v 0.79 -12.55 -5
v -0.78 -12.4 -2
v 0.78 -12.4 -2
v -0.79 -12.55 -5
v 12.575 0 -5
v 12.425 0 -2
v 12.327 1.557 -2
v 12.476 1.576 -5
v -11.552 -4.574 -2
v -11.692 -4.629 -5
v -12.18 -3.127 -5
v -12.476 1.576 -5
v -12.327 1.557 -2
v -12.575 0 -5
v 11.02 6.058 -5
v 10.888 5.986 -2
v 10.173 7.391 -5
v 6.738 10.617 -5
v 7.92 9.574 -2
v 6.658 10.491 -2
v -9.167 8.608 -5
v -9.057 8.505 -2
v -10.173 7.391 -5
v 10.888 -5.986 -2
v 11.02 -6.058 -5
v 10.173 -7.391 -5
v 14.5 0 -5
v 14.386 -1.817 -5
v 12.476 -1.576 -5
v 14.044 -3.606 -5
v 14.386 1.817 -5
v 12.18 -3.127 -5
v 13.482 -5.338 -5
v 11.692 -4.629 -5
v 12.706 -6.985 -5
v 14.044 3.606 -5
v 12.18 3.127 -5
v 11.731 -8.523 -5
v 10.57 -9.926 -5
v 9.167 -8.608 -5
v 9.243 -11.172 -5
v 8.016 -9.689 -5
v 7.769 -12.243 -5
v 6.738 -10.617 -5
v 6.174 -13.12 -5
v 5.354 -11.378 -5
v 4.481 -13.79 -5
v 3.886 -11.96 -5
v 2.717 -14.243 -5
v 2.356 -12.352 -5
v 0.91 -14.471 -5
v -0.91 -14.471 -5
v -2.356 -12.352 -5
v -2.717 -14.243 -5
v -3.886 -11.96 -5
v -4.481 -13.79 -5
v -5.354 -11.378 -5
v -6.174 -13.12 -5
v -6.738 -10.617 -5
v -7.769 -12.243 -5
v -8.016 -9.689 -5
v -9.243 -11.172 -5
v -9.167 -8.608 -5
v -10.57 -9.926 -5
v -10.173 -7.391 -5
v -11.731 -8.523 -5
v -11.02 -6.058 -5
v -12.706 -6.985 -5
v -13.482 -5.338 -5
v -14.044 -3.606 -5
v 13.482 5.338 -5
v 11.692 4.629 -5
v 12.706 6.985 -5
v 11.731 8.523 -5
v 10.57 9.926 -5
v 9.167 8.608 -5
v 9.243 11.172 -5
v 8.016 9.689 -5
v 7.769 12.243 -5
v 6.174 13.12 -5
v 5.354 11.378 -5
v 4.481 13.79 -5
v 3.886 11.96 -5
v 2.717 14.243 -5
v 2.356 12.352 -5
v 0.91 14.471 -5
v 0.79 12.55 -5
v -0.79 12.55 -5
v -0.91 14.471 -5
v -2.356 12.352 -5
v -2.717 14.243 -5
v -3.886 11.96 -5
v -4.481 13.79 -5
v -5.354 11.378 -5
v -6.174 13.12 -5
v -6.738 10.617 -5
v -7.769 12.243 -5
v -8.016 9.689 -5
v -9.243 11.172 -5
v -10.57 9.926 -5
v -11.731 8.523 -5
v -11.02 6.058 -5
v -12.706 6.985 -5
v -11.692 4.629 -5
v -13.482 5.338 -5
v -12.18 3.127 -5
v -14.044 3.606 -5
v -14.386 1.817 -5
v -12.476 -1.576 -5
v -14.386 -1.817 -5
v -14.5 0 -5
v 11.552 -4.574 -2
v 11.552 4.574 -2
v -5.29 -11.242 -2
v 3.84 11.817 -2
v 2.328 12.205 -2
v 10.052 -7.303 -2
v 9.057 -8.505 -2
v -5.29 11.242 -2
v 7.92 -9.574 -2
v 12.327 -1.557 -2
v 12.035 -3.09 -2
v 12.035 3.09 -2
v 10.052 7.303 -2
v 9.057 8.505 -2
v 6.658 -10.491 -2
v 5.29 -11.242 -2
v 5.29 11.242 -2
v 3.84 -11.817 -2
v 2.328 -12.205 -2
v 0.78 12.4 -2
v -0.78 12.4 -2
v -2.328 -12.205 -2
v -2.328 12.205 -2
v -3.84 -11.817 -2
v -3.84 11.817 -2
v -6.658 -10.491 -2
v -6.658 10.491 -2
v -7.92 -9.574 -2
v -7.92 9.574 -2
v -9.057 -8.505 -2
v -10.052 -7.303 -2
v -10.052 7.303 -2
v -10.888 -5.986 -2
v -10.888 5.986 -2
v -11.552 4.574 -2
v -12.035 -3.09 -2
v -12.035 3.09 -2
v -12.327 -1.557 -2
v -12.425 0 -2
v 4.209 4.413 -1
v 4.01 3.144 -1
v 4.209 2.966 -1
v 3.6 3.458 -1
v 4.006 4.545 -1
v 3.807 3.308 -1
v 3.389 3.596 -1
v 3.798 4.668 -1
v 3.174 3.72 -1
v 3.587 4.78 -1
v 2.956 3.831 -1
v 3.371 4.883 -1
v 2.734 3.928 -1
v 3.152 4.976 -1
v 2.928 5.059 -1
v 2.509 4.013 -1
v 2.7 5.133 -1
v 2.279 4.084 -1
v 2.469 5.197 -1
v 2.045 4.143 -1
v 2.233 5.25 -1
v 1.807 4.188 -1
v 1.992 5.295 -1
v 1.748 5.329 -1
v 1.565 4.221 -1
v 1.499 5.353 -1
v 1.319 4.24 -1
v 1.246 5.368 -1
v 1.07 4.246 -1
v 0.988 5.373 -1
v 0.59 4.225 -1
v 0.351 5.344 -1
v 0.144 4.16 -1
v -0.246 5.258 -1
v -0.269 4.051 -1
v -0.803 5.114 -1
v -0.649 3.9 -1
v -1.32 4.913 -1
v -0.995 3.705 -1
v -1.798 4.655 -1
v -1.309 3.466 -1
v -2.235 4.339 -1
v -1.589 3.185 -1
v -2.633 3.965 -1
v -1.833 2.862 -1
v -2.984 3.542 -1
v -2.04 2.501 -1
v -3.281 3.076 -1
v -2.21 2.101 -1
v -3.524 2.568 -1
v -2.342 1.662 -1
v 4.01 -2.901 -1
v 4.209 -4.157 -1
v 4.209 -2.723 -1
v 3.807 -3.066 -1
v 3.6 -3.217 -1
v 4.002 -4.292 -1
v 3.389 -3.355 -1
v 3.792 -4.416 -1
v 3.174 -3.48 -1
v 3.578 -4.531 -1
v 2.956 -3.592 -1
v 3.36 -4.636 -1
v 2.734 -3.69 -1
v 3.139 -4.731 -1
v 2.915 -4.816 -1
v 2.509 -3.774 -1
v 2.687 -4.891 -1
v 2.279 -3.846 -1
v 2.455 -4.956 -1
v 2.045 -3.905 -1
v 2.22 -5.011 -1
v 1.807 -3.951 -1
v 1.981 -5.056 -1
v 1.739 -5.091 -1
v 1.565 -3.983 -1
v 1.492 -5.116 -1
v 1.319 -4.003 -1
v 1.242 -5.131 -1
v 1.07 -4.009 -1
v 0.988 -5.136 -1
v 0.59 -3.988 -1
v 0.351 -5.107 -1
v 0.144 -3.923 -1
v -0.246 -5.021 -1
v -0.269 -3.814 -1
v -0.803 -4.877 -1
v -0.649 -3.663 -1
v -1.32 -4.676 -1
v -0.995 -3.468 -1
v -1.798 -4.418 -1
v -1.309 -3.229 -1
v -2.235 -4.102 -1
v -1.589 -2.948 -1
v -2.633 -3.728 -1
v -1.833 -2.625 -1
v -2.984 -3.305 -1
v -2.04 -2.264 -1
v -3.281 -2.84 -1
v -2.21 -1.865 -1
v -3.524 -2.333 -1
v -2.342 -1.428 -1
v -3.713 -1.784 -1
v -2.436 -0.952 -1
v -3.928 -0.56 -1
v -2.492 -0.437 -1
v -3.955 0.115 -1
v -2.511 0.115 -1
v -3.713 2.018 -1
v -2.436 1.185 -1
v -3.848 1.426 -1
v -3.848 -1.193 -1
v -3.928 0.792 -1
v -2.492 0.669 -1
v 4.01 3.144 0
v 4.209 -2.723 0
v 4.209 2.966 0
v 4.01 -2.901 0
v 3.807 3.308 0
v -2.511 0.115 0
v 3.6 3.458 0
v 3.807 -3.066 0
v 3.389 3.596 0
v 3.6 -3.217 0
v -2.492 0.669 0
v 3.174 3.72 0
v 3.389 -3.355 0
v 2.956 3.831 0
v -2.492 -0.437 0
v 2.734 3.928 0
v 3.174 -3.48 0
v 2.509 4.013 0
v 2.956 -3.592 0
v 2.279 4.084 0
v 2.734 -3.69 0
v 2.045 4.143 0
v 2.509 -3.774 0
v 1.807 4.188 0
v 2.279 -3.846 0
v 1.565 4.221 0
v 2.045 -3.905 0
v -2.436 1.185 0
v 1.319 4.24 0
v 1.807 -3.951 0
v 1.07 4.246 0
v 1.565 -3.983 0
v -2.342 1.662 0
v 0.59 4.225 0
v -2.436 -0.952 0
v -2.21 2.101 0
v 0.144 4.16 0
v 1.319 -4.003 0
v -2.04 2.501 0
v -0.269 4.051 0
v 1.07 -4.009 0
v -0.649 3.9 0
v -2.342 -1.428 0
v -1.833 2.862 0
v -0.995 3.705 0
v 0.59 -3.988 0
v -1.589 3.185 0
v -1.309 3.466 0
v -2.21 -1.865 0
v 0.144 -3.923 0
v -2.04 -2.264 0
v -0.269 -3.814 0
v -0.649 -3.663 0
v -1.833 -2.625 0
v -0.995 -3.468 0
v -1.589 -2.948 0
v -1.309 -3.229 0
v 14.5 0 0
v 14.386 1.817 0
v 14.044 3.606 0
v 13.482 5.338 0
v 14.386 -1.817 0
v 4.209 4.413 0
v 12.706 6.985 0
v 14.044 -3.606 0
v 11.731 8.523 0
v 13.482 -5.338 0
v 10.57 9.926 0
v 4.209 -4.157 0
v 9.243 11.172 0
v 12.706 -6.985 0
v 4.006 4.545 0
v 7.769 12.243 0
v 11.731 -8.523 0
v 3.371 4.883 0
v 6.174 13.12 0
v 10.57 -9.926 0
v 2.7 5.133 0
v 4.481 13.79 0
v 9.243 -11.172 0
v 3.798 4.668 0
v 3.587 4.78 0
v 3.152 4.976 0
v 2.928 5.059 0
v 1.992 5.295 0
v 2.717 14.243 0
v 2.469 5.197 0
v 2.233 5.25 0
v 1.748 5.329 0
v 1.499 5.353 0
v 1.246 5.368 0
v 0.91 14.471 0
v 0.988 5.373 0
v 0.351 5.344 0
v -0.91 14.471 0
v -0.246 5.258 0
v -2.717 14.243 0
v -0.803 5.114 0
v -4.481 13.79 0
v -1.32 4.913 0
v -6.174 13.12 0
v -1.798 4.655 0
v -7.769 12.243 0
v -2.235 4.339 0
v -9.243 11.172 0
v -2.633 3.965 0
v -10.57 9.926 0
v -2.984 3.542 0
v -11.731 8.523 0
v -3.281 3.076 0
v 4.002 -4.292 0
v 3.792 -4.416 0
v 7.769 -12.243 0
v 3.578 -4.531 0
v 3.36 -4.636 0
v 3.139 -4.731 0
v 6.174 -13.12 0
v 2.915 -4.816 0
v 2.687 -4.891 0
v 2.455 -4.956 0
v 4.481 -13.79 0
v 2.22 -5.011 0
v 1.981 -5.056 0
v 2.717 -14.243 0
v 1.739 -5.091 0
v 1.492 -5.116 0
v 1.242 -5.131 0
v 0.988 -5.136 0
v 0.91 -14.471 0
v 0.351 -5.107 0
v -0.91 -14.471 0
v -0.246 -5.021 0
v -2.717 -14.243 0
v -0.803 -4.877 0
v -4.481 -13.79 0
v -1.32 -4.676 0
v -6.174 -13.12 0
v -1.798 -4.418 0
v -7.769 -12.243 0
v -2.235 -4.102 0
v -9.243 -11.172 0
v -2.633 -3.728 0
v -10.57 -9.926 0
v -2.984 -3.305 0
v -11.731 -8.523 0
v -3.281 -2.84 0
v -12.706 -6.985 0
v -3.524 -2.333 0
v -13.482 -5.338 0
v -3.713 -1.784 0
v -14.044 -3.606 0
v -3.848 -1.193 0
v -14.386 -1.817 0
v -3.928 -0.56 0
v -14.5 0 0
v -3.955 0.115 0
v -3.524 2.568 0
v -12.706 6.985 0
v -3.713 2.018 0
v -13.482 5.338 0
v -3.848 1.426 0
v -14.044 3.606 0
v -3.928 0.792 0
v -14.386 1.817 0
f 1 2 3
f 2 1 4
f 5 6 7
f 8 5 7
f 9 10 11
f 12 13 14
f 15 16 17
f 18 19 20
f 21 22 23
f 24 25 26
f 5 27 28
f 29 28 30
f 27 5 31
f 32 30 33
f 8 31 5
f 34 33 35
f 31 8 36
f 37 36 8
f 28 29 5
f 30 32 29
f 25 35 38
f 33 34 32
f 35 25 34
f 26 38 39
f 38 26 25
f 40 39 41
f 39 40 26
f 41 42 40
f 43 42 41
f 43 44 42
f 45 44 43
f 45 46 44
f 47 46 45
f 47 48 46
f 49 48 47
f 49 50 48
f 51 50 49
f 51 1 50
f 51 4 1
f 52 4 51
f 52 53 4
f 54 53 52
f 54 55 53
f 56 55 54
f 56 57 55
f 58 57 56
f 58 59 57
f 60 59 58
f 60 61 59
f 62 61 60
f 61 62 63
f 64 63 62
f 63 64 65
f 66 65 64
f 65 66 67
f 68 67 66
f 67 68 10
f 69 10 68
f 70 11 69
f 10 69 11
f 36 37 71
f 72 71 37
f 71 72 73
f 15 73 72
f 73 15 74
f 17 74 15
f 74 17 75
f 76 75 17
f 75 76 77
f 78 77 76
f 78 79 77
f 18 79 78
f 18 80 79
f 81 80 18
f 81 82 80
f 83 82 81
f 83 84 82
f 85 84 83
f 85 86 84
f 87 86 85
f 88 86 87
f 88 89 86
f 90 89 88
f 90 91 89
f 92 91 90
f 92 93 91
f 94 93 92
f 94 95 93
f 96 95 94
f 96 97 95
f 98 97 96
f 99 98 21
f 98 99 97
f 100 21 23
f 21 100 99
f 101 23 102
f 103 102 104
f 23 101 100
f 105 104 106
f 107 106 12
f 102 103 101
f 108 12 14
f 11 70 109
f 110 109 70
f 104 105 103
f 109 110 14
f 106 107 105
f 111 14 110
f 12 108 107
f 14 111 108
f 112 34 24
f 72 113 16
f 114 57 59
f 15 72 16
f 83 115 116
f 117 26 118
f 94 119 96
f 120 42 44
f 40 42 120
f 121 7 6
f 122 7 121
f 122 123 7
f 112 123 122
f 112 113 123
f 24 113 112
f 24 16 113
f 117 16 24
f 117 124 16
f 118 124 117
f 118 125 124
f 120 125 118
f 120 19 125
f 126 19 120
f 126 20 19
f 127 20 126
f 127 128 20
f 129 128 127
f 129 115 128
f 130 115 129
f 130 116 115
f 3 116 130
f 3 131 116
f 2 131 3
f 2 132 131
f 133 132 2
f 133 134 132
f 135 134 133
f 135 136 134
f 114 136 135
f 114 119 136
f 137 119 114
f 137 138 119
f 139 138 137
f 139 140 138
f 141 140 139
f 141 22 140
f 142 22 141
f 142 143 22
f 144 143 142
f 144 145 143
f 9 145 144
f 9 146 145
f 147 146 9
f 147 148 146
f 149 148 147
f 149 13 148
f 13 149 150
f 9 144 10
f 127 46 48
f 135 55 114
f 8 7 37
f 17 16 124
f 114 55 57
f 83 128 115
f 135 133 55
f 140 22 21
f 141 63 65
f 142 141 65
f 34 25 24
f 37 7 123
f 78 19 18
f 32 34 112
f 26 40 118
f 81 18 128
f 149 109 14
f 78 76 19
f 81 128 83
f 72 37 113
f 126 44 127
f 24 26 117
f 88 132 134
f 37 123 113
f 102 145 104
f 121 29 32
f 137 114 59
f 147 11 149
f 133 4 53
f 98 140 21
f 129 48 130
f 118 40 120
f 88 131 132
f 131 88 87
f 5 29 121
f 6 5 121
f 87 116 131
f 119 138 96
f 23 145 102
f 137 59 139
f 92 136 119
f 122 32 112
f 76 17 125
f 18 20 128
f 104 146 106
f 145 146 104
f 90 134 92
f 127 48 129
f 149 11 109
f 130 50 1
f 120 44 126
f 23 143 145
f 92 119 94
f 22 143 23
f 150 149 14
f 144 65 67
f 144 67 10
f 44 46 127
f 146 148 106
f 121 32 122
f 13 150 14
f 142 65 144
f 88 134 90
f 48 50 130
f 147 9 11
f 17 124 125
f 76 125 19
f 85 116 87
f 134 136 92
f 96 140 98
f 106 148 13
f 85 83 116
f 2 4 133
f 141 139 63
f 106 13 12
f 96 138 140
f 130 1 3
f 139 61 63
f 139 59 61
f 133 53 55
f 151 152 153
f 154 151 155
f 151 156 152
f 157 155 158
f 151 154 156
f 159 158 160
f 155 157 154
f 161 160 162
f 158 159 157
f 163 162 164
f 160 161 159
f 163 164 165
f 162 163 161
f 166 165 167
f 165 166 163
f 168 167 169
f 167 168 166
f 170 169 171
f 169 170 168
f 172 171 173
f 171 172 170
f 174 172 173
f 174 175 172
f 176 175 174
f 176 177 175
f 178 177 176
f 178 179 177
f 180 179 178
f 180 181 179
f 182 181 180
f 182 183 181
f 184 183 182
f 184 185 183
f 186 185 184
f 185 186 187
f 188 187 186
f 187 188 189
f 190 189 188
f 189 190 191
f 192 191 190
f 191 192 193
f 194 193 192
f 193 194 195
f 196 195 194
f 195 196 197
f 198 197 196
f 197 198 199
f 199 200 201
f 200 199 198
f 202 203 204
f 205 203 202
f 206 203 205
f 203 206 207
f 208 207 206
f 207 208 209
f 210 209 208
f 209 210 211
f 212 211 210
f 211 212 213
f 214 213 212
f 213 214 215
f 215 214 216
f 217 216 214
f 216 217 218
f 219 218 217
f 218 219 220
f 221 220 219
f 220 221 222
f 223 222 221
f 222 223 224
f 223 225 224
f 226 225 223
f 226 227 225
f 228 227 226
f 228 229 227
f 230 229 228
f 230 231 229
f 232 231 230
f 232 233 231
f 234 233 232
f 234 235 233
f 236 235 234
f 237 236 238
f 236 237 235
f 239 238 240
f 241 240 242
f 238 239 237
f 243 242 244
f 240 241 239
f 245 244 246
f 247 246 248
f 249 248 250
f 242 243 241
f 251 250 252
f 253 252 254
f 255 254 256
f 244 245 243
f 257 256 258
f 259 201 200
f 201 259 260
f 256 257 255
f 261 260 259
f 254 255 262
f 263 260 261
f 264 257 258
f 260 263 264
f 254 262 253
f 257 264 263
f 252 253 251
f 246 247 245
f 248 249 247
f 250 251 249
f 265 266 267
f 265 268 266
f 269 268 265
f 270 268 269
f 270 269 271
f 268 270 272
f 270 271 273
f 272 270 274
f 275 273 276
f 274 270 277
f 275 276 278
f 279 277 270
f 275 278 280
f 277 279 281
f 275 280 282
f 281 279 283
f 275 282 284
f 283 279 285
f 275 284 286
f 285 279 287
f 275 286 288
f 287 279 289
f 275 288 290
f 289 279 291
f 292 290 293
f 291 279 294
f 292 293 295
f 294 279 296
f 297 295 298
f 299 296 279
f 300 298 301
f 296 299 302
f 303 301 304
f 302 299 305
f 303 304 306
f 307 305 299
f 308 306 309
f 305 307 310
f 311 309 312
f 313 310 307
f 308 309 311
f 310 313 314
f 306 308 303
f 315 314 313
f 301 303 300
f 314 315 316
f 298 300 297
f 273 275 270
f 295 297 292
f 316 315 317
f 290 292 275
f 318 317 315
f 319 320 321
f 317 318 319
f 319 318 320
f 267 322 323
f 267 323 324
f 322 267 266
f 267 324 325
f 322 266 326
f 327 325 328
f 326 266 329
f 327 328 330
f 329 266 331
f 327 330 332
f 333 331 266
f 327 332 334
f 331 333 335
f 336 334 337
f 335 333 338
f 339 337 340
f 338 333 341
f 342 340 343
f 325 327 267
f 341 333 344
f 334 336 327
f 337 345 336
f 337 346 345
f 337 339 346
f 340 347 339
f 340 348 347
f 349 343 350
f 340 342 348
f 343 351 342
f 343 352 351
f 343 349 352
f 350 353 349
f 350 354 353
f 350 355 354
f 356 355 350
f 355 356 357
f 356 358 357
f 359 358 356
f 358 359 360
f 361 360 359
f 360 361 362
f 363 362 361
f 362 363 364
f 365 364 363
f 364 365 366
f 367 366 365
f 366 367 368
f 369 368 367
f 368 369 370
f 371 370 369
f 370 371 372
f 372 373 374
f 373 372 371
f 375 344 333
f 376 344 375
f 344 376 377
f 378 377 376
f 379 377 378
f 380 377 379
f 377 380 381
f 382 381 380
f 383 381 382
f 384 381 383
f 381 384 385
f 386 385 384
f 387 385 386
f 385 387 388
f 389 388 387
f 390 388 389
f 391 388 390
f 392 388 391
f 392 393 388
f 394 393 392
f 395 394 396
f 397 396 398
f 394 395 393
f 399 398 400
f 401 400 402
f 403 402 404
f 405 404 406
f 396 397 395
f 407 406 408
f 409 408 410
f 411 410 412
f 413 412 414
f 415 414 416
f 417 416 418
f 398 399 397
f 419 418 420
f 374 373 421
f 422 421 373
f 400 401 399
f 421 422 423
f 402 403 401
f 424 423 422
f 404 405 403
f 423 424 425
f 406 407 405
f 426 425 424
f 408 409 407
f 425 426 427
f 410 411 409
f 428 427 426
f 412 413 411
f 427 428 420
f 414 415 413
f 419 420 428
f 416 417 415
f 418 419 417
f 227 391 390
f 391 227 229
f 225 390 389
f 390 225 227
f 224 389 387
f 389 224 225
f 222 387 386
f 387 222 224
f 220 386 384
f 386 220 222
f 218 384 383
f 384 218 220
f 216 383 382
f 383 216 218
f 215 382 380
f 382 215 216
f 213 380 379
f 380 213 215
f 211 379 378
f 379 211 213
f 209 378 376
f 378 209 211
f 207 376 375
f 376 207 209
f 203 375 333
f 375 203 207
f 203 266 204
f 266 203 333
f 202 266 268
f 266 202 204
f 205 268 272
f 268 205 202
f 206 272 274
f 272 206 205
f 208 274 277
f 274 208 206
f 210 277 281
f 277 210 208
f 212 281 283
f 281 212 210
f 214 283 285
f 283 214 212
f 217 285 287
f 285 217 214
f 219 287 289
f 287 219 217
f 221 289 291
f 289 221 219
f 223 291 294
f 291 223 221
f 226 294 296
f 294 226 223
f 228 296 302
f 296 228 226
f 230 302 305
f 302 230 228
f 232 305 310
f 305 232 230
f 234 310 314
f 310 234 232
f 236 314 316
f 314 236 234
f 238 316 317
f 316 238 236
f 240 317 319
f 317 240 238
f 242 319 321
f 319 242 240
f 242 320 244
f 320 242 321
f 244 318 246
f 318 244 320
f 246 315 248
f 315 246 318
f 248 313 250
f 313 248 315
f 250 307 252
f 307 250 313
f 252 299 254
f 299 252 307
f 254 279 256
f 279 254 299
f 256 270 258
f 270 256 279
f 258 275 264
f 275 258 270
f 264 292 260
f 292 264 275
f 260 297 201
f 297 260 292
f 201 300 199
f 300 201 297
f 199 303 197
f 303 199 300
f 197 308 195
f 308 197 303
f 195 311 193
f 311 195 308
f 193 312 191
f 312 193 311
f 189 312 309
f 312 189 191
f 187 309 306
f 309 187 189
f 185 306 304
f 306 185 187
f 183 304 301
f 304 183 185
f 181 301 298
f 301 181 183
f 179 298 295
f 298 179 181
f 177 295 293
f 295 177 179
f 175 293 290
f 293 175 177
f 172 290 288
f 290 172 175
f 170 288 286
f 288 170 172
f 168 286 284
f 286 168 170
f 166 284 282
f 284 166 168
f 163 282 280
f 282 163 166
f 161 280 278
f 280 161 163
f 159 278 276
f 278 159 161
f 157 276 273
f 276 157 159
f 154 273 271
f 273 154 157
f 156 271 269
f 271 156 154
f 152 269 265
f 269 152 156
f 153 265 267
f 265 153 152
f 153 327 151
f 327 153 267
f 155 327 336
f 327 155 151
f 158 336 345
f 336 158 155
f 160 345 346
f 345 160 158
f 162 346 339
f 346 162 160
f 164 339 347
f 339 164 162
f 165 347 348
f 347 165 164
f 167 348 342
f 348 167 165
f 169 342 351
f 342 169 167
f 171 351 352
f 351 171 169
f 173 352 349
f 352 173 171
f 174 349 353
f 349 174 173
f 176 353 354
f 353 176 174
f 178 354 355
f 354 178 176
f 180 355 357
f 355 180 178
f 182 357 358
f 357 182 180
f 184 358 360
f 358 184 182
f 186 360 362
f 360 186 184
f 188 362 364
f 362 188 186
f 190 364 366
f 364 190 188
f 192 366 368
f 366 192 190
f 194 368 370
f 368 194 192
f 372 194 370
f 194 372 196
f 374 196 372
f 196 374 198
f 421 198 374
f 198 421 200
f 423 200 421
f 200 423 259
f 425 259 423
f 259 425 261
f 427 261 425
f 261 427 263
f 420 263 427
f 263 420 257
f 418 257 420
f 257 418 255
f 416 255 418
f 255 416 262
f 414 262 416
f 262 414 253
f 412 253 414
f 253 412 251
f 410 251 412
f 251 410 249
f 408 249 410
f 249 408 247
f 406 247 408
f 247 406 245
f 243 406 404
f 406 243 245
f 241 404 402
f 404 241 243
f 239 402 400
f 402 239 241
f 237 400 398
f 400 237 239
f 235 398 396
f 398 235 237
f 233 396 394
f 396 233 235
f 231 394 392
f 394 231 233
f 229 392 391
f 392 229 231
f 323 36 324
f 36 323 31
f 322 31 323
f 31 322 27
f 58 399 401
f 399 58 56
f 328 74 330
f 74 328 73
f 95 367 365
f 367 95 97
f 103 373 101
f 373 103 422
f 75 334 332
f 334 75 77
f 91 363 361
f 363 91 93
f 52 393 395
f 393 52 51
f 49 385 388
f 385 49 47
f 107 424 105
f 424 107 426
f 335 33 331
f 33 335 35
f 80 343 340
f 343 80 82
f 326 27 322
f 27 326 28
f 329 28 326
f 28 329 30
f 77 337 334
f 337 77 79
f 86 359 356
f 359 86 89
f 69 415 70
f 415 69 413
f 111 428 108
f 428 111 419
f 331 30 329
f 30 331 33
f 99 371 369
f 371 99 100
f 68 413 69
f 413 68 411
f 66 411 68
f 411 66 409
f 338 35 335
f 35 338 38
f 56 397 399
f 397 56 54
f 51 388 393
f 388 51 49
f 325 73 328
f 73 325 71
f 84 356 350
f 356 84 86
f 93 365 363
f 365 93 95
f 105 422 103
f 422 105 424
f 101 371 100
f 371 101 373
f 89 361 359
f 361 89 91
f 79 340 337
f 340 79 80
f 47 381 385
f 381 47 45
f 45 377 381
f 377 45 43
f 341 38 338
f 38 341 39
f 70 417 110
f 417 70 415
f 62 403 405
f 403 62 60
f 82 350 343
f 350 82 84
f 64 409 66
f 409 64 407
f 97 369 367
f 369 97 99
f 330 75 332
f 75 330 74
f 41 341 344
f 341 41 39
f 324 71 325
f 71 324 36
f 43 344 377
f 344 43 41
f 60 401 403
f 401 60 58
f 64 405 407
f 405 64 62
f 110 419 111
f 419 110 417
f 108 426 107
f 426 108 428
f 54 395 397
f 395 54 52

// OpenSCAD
$fn = 50;


difference() {
	union() {
		translate(v = [0, 0, -5.0000000000]) {
			cylinder(h = 5, r = 14.5000000000);
		}
	}
	union() {
		#translate(v = [0, 0, -5.0000000000]) {
			cylinder(h = 3, r1 = 12.5750000000, r2 = 12.4250000000);
		}
		translate(v = [0, 0, -1]) {
			linear_extrude(height = 1) {
				text(font = "Impact", halign = "center", size = 10, text = "C", valign = "center");
			}
		}
	}
}
